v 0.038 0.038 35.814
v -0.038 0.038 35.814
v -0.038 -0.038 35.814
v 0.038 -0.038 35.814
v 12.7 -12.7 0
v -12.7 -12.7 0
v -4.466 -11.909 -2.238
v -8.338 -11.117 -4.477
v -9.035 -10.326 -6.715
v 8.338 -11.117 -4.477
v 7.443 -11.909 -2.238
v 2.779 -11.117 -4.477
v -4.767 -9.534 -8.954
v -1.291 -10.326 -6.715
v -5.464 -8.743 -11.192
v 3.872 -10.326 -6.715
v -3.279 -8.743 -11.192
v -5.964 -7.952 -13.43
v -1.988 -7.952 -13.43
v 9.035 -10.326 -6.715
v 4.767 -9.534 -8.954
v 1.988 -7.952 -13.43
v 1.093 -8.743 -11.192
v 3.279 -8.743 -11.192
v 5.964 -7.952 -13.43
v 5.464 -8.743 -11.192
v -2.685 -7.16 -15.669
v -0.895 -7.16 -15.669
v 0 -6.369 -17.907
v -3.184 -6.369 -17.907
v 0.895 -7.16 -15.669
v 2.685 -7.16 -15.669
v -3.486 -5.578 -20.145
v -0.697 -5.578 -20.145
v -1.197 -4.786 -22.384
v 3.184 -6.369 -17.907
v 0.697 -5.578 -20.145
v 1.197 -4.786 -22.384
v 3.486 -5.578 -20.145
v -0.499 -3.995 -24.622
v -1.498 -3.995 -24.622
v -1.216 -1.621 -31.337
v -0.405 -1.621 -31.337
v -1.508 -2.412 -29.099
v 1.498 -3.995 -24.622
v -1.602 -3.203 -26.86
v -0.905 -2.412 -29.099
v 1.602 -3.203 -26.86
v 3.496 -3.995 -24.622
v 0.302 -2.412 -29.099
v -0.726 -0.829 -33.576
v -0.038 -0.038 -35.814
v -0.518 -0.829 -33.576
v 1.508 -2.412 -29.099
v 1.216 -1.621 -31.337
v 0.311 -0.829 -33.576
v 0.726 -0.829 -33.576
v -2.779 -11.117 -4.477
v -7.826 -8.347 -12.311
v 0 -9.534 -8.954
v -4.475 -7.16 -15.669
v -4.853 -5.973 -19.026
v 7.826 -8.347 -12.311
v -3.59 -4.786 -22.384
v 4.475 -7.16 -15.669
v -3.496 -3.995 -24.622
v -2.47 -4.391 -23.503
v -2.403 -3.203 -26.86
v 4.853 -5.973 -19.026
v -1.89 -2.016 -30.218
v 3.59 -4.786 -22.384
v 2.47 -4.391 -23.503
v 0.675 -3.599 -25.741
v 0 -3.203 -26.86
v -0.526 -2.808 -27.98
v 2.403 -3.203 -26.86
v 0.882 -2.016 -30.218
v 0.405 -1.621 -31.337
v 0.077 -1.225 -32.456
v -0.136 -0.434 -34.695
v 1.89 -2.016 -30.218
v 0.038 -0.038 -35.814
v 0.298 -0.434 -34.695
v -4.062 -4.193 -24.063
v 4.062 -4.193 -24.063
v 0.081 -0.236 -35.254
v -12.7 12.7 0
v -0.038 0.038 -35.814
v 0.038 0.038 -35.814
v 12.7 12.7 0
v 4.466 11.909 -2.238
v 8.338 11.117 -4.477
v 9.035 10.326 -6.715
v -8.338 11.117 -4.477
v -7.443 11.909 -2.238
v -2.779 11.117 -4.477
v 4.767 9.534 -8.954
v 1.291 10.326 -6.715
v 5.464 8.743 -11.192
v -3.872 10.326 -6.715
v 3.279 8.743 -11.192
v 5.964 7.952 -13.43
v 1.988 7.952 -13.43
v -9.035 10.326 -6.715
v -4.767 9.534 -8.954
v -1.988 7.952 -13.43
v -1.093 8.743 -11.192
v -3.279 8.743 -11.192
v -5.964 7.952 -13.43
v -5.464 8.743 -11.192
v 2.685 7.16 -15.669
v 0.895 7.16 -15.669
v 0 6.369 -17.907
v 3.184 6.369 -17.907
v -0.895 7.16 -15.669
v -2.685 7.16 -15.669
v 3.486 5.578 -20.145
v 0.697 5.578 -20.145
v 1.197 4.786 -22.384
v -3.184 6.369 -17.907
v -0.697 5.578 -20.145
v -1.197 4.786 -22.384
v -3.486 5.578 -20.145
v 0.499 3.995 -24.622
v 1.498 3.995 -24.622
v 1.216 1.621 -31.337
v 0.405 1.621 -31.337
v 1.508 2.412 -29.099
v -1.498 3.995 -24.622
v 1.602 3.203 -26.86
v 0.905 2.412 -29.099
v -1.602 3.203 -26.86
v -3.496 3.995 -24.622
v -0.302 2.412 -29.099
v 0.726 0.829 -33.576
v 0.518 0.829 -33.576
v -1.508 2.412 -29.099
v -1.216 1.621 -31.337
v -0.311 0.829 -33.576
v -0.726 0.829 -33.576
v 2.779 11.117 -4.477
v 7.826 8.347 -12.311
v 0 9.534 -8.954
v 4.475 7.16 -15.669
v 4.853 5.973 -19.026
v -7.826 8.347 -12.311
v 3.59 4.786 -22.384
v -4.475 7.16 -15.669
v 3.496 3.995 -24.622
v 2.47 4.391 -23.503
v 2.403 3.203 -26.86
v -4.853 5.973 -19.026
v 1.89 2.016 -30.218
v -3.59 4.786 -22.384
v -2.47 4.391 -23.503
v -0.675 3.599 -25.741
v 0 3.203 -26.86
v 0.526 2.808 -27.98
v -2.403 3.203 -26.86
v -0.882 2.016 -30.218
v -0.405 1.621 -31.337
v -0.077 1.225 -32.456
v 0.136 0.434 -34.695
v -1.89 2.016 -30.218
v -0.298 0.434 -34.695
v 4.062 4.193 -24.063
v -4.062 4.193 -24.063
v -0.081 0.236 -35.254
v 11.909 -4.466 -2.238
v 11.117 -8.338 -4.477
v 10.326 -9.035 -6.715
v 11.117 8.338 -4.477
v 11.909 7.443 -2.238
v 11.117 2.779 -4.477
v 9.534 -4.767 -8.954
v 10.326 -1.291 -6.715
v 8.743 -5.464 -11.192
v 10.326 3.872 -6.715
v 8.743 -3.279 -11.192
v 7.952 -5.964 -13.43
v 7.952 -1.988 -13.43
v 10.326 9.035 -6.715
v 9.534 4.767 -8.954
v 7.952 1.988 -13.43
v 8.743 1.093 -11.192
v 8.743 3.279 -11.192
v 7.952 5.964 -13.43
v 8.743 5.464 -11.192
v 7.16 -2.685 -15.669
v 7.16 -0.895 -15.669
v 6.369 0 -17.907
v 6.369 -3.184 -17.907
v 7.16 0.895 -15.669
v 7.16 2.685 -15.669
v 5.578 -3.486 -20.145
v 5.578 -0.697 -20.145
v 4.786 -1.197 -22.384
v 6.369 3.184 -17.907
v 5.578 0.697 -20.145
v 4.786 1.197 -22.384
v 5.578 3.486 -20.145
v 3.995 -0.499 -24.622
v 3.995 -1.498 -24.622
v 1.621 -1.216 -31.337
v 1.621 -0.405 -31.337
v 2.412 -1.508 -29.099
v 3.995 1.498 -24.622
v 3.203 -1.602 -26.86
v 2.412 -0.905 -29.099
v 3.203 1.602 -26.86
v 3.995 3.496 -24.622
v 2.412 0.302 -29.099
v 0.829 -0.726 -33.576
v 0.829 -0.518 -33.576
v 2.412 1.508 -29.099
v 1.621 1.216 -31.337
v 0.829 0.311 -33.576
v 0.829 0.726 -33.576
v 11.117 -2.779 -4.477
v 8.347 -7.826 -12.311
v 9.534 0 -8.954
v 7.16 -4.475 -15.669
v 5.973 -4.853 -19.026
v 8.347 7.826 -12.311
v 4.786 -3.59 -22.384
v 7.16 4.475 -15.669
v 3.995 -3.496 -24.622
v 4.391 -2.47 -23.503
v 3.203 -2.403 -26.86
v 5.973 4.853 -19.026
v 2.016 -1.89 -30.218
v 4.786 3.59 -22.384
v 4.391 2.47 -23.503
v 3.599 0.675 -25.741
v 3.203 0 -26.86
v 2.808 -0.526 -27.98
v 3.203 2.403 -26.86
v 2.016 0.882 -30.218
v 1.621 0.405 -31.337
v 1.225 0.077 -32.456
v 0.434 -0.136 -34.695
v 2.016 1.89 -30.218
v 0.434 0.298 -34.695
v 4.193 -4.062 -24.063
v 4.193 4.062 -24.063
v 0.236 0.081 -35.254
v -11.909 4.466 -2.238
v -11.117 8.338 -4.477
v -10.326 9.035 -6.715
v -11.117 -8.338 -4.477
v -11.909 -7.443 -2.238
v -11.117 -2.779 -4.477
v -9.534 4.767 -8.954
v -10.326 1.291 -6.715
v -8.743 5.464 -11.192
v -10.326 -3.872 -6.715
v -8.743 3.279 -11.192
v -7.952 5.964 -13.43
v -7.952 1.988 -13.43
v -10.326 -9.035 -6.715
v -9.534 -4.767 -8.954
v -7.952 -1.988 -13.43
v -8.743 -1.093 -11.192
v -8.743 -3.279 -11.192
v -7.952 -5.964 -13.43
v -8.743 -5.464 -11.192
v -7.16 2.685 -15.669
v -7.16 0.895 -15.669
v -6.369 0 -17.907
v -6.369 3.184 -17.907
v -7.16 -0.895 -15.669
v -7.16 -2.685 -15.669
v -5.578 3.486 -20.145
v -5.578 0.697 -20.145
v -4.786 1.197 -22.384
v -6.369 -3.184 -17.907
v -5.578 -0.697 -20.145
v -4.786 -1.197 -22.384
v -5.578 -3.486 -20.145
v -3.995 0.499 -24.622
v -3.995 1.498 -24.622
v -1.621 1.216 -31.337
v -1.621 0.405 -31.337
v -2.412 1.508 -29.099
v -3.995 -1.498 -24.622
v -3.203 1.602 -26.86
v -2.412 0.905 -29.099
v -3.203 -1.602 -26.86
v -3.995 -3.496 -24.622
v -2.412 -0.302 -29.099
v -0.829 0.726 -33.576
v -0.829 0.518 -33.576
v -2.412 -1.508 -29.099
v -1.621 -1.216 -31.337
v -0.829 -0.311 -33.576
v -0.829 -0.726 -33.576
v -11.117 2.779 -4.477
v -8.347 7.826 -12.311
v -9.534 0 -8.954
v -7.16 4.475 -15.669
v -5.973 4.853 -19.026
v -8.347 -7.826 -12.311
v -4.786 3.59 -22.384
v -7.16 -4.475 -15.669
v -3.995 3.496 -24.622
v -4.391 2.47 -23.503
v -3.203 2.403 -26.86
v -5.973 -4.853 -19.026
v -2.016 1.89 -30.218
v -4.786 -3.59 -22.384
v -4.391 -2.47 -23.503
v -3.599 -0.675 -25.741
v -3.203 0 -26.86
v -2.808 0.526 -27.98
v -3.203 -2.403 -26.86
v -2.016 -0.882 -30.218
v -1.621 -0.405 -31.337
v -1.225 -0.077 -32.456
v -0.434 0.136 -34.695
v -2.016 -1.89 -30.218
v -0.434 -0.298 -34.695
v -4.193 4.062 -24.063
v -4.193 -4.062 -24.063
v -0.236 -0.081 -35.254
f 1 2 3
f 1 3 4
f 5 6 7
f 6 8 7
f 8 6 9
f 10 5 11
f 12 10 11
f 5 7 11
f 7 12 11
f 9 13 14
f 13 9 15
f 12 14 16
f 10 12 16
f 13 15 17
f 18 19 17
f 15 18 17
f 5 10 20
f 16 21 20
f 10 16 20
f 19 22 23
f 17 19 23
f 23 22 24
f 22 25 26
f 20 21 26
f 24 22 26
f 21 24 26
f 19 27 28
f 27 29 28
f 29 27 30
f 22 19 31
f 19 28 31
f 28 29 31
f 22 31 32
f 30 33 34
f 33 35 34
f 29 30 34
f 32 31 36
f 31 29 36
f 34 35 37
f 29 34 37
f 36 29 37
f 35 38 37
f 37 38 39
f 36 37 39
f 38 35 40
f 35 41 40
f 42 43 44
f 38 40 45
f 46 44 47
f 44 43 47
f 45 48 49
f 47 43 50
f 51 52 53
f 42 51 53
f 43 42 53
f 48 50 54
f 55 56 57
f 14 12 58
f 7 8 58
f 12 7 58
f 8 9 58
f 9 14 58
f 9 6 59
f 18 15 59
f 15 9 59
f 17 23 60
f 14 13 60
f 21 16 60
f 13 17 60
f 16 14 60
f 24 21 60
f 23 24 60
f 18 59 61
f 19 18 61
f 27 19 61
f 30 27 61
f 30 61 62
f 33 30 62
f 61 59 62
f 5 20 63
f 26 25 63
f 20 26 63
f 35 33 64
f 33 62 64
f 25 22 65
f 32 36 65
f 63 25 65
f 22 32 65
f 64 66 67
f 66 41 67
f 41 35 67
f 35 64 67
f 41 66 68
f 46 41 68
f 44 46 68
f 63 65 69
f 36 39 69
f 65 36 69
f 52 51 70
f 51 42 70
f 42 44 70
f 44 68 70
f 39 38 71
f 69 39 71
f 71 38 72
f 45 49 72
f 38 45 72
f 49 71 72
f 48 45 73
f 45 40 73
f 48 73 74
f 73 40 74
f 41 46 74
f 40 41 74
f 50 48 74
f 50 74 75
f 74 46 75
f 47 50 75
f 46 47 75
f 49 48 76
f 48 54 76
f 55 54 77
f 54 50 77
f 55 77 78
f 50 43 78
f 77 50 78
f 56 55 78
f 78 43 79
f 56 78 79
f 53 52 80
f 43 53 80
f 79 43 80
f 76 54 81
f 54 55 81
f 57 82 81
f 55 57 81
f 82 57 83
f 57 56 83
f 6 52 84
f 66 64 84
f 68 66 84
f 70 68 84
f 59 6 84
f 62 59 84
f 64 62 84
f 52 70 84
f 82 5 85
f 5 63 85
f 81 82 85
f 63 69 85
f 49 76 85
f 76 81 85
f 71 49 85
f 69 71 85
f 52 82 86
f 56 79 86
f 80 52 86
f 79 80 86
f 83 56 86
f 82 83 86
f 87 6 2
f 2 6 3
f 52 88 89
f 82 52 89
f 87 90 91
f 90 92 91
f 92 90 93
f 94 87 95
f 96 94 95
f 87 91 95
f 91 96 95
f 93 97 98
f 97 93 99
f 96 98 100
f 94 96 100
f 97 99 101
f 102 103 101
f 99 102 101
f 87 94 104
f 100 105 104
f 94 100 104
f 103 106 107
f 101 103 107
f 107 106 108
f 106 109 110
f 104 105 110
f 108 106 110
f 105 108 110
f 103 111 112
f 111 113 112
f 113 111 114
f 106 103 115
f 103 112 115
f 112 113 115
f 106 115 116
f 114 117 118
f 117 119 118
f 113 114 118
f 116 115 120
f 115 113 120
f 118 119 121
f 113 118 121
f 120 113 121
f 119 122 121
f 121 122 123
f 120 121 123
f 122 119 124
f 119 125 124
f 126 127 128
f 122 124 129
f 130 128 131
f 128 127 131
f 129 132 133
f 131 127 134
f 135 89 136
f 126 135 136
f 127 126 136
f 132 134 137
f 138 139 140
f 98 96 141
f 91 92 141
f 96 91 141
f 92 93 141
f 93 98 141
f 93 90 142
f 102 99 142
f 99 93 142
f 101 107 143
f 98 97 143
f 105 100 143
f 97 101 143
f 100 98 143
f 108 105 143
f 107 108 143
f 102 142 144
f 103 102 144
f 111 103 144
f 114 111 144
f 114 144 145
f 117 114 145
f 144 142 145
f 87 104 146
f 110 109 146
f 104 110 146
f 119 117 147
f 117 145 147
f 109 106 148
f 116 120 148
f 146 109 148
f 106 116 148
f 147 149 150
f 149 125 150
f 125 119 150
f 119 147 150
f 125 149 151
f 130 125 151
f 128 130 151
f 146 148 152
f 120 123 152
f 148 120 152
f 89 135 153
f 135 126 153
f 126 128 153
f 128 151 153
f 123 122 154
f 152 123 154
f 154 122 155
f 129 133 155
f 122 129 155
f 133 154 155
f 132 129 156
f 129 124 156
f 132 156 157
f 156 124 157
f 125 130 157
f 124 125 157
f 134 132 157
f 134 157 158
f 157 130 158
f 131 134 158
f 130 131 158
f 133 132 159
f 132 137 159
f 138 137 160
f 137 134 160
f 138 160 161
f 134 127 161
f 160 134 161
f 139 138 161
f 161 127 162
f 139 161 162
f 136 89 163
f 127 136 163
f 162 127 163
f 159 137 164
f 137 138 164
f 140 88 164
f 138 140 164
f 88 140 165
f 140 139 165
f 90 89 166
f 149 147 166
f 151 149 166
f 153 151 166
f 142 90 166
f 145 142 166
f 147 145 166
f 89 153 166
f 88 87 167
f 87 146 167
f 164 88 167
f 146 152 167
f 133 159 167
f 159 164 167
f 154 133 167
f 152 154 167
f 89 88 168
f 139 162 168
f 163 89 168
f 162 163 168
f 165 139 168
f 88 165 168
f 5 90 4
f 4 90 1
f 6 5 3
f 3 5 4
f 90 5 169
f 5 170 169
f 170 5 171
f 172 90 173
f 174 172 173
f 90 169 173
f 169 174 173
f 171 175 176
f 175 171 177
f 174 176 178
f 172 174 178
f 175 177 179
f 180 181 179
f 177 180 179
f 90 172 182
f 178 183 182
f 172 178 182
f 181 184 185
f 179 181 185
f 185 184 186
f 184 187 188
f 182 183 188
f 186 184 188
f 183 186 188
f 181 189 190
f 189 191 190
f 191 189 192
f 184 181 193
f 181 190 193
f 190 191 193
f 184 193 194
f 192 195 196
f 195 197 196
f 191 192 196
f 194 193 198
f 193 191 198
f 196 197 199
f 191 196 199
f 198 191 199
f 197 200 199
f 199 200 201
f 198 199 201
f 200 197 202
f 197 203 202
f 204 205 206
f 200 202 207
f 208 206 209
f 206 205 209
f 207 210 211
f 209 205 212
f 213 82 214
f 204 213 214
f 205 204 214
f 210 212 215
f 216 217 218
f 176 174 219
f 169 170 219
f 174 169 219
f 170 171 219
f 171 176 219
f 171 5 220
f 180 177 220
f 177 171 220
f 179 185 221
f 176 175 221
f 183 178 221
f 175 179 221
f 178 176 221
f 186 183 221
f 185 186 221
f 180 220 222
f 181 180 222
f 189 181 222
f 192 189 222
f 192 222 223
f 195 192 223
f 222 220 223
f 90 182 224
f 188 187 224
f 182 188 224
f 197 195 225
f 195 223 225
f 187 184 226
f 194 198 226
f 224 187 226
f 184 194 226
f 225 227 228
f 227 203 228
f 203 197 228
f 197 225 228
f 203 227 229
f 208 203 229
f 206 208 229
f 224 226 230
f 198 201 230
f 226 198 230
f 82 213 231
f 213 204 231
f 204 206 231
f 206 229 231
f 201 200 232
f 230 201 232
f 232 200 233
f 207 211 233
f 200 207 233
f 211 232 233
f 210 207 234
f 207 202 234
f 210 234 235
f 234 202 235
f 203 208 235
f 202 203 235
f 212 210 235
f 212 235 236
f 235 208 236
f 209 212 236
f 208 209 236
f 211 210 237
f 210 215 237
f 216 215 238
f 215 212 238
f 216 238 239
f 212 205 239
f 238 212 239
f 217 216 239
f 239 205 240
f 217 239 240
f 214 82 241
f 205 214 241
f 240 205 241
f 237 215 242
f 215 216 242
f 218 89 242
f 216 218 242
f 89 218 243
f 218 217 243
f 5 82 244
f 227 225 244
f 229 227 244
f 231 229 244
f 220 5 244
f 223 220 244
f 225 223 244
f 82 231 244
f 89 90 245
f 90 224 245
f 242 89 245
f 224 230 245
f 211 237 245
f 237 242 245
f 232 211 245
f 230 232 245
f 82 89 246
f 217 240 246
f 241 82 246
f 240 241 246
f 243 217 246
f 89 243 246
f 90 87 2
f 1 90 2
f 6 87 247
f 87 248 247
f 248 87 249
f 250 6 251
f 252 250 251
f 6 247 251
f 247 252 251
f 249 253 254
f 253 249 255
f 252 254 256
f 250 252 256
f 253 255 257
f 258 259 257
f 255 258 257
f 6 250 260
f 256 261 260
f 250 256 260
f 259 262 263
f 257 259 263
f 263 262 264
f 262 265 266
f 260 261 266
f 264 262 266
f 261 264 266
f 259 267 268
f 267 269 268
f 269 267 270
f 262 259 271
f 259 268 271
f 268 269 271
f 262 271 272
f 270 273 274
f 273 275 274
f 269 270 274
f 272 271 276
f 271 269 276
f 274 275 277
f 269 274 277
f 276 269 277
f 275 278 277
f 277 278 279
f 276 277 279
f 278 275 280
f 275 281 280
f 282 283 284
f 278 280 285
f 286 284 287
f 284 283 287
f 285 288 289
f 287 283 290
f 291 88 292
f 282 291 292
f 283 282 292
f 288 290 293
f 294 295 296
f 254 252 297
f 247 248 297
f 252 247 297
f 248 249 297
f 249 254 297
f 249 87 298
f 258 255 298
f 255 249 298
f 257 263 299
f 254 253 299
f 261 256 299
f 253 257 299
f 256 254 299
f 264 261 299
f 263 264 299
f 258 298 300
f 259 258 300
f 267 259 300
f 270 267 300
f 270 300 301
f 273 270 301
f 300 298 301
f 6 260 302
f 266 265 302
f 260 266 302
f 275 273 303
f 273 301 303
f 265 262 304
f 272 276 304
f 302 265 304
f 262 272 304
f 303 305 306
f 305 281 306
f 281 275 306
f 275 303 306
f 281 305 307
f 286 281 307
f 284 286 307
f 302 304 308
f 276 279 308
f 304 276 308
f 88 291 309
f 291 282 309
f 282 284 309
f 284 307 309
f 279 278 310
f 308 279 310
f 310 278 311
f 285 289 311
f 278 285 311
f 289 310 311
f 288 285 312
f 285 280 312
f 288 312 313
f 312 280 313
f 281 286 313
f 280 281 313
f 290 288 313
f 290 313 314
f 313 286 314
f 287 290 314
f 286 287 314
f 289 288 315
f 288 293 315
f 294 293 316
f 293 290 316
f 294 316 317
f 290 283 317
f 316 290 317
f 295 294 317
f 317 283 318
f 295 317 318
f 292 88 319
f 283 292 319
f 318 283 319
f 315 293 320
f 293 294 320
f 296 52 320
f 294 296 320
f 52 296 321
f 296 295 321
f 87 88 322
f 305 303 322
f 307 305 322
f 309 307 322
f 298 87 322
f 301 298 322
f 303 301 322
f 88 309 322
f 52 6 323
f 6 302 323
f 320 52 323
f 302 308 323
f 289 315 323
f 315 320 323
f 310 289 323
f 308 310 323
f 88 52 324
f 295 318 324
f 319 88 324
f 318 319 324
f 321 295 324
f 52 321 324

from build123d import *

# Parameters (mm, degrees)
F0_W     = 25.4
F0_H     = 25.4
F1_DEPTH = 35.814
F1_TAPER = 19.471
F2_W     = 25.4
F2_H     = 25.4
F3_DEPTH = 35.814
F3_TAPER = 19.471


with BuildPart() as f1:
    # F0 (on Top) → F1 (new body)
    with BuildSketch(Plane.XY):
        Rectangle(F0_W, F0_H)
    extrude(amount=F1_DEPTH, taper=F1_TAPER)

    # F2 (on Top) → F3 (join)
    with BuildSketch(Plane.XY):
        Rectangle(F2_W, F2_H)
    extrude(amount=-F3_DEPTH, taper=F3_TAPER)


solid = f1.part
